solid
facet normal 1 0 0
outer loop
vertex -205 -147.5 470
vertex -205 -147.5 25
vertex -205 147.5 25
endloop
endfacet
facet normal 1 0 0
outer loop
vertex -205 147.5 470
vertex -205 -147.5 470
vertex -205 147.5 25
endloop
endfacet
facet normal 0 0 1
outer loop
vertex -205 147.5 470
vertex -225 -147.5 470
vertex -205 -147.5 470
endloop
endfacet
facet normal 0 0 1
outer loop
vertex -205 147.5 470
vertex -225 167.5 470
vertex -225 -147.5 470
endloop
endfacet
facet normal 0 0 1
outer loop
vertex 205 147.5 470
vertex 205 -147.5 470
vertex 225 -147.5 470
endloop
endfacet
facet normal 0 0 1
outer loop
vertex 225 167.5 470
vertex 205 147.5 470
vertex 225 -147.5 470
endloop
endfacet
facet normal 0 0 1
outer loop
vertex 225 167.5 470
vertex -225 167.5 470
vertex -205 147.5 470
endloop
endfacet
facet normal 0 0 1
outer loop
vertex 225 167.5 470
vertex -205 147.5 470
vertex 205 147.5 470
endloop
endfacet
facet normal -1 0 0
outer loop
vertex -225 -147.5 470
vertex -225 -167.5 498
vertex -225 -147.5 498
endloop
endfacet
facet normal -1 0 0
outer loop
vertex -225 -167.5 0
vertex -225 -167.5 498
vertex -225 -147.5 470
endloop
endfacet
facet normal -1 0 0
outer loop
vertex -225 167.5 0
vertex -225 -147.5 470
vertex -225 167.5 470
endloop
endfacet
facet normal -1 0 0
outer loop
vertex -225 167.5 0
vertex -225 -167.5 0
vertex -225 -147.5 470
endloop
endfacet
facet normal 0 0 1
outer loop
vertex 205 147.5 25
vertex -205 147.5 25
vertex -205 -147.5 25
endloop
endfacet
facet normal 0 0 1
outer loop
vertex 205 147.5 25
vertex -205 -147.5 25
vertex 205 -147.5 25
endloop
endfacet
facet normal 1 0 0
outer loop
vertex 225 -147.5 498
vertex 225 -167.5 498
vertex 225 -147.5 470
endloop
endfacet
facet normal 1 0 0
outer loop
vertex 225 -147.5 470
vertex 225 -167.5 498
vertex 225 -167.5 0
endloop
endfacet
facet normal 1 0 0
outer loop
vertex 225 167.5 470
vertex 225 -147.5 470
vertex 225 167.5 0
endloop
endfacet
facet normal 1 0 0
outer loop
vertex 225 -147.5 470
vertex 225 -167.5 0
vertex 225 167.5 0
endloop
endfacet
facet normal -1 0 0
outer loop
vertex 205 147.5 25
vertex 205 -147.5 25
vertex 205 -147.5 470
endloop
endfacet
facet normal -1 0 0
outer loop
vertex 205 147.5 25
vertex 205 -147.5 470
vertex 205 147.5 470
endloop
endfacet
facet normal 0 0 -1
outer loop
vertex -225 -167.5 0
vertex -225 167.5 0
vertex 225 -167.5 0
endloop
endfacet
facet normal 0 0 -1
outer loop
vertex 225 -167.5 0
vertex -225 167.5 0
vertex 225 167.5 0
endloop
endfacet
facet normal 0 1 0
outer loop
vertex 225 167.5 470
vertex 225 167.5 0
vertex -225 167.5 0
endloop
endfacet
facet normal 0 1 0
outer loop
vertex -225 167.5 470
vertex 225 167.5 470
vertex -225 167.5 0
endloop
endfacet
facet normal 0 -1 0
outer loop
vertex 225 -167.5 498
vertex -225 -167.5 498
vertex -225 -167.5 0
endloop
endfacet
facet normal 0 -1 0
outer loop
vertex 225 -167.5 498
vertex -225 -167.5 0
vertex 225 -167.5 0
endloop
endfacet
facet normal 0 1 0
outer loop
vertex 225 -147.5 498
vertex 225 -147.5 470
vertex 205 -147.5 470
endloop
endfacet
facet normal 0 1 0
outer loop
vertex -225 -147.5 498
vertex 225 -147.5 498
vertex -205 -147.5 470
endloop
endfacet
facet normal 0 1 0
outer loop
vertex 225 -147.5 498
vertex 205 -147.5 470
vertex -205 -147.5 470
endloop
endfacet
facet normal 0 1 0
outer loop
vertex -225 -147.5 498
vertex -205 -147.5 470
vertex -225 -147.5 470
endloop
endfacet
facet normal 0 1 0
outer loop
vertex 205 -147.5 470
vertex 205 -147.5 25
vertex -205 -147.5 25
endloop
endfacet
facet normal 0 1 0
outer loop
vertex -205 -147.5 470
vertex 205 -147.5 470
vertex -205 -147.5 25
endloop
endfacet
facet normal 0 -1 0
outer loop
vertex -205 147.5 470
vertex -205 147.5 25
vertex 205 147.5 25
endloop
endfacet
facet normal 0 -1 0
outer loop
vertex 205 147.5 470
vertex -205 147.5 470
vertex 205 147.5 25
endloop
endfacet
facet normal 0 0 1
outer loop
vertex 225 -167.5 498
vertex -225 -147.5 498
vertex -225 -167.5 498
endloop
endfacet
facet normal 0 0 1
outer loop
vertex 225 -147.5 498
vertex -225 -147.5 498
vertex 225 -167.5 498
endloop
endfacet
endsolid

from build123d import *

# Parameters (mm, degrees)
F0_W     = 410
F0_H     = 20
F0_W_2   = 20
F1_DEPTH = 498
F0_H_2   = 295
F2_DEPTH = 470
F3_DEPTH = 25


with BuildPart() as f1:
    # F0 (on Top) → F1 (new body)
    with BuildSketch(Plane.XY):
        with Locations((0, -157.5)):
            Rectangle(F0_W, F0_H)
        with Locations((-215, -157.5)):
            Rectangle(F0_W_2, F0_H)
        with Locations((215, -157.5)):
            Rectangle(F0_W_2, F0_H)
    extrude(amount=F1_DEPTH)

    # F0 (on Top) → F2 (join)
    with BuildSketch(Plane.XY):
        with Locations((-215, 0)):
            Rectangle(F0_W_2, F0_H_2)
        with Locations((-215, 157.5)):
            Rectangle(F0_W_2, F0_H)
        with Locations((0, 157.5)):
            Rectangle(F0_W, F0_H)
        with Locations((215, 157.5)):
            Rectangle(F0_W_2, F0_H)
        with Locations((215, 0)):
            Rectangle(F0_W_2, F0_H_2)
    extrude(amount=F2_DEPTH)

    # F0 (on Top) → F3 (join)
    with BuildSketch(Plane.XY):
        with Locations((215, -157.5)):
            Rectangle(F0_W_2, F0_H)
        with Locations((0, -157.5)):
            Rectangle(F0_W, F0_H)
        with Locations((215, 0)):
            Rectangle(F0_W_2, F0_H_2)
        with Locations((-215, -157.5)):
            Rectangle(F0_W_2, F0_H)
        with Locations((215, 157.5)):
            Rectangle(F0_W_2, F0_H)
        with Locations((-215, 0)):
            Rectangle(F0_W_2, F0_H_2)
        with Locations((0, 157.5)):
            Rectangle(F0_W, F0_H)
        with Locations((-215, 157.5)):
            Rectangle(F0_W_2, F0_H)
        Rectangle(F0_W, F0_H_2)
    extrude(amount=F3_DEPTH)


solid = f1.part
